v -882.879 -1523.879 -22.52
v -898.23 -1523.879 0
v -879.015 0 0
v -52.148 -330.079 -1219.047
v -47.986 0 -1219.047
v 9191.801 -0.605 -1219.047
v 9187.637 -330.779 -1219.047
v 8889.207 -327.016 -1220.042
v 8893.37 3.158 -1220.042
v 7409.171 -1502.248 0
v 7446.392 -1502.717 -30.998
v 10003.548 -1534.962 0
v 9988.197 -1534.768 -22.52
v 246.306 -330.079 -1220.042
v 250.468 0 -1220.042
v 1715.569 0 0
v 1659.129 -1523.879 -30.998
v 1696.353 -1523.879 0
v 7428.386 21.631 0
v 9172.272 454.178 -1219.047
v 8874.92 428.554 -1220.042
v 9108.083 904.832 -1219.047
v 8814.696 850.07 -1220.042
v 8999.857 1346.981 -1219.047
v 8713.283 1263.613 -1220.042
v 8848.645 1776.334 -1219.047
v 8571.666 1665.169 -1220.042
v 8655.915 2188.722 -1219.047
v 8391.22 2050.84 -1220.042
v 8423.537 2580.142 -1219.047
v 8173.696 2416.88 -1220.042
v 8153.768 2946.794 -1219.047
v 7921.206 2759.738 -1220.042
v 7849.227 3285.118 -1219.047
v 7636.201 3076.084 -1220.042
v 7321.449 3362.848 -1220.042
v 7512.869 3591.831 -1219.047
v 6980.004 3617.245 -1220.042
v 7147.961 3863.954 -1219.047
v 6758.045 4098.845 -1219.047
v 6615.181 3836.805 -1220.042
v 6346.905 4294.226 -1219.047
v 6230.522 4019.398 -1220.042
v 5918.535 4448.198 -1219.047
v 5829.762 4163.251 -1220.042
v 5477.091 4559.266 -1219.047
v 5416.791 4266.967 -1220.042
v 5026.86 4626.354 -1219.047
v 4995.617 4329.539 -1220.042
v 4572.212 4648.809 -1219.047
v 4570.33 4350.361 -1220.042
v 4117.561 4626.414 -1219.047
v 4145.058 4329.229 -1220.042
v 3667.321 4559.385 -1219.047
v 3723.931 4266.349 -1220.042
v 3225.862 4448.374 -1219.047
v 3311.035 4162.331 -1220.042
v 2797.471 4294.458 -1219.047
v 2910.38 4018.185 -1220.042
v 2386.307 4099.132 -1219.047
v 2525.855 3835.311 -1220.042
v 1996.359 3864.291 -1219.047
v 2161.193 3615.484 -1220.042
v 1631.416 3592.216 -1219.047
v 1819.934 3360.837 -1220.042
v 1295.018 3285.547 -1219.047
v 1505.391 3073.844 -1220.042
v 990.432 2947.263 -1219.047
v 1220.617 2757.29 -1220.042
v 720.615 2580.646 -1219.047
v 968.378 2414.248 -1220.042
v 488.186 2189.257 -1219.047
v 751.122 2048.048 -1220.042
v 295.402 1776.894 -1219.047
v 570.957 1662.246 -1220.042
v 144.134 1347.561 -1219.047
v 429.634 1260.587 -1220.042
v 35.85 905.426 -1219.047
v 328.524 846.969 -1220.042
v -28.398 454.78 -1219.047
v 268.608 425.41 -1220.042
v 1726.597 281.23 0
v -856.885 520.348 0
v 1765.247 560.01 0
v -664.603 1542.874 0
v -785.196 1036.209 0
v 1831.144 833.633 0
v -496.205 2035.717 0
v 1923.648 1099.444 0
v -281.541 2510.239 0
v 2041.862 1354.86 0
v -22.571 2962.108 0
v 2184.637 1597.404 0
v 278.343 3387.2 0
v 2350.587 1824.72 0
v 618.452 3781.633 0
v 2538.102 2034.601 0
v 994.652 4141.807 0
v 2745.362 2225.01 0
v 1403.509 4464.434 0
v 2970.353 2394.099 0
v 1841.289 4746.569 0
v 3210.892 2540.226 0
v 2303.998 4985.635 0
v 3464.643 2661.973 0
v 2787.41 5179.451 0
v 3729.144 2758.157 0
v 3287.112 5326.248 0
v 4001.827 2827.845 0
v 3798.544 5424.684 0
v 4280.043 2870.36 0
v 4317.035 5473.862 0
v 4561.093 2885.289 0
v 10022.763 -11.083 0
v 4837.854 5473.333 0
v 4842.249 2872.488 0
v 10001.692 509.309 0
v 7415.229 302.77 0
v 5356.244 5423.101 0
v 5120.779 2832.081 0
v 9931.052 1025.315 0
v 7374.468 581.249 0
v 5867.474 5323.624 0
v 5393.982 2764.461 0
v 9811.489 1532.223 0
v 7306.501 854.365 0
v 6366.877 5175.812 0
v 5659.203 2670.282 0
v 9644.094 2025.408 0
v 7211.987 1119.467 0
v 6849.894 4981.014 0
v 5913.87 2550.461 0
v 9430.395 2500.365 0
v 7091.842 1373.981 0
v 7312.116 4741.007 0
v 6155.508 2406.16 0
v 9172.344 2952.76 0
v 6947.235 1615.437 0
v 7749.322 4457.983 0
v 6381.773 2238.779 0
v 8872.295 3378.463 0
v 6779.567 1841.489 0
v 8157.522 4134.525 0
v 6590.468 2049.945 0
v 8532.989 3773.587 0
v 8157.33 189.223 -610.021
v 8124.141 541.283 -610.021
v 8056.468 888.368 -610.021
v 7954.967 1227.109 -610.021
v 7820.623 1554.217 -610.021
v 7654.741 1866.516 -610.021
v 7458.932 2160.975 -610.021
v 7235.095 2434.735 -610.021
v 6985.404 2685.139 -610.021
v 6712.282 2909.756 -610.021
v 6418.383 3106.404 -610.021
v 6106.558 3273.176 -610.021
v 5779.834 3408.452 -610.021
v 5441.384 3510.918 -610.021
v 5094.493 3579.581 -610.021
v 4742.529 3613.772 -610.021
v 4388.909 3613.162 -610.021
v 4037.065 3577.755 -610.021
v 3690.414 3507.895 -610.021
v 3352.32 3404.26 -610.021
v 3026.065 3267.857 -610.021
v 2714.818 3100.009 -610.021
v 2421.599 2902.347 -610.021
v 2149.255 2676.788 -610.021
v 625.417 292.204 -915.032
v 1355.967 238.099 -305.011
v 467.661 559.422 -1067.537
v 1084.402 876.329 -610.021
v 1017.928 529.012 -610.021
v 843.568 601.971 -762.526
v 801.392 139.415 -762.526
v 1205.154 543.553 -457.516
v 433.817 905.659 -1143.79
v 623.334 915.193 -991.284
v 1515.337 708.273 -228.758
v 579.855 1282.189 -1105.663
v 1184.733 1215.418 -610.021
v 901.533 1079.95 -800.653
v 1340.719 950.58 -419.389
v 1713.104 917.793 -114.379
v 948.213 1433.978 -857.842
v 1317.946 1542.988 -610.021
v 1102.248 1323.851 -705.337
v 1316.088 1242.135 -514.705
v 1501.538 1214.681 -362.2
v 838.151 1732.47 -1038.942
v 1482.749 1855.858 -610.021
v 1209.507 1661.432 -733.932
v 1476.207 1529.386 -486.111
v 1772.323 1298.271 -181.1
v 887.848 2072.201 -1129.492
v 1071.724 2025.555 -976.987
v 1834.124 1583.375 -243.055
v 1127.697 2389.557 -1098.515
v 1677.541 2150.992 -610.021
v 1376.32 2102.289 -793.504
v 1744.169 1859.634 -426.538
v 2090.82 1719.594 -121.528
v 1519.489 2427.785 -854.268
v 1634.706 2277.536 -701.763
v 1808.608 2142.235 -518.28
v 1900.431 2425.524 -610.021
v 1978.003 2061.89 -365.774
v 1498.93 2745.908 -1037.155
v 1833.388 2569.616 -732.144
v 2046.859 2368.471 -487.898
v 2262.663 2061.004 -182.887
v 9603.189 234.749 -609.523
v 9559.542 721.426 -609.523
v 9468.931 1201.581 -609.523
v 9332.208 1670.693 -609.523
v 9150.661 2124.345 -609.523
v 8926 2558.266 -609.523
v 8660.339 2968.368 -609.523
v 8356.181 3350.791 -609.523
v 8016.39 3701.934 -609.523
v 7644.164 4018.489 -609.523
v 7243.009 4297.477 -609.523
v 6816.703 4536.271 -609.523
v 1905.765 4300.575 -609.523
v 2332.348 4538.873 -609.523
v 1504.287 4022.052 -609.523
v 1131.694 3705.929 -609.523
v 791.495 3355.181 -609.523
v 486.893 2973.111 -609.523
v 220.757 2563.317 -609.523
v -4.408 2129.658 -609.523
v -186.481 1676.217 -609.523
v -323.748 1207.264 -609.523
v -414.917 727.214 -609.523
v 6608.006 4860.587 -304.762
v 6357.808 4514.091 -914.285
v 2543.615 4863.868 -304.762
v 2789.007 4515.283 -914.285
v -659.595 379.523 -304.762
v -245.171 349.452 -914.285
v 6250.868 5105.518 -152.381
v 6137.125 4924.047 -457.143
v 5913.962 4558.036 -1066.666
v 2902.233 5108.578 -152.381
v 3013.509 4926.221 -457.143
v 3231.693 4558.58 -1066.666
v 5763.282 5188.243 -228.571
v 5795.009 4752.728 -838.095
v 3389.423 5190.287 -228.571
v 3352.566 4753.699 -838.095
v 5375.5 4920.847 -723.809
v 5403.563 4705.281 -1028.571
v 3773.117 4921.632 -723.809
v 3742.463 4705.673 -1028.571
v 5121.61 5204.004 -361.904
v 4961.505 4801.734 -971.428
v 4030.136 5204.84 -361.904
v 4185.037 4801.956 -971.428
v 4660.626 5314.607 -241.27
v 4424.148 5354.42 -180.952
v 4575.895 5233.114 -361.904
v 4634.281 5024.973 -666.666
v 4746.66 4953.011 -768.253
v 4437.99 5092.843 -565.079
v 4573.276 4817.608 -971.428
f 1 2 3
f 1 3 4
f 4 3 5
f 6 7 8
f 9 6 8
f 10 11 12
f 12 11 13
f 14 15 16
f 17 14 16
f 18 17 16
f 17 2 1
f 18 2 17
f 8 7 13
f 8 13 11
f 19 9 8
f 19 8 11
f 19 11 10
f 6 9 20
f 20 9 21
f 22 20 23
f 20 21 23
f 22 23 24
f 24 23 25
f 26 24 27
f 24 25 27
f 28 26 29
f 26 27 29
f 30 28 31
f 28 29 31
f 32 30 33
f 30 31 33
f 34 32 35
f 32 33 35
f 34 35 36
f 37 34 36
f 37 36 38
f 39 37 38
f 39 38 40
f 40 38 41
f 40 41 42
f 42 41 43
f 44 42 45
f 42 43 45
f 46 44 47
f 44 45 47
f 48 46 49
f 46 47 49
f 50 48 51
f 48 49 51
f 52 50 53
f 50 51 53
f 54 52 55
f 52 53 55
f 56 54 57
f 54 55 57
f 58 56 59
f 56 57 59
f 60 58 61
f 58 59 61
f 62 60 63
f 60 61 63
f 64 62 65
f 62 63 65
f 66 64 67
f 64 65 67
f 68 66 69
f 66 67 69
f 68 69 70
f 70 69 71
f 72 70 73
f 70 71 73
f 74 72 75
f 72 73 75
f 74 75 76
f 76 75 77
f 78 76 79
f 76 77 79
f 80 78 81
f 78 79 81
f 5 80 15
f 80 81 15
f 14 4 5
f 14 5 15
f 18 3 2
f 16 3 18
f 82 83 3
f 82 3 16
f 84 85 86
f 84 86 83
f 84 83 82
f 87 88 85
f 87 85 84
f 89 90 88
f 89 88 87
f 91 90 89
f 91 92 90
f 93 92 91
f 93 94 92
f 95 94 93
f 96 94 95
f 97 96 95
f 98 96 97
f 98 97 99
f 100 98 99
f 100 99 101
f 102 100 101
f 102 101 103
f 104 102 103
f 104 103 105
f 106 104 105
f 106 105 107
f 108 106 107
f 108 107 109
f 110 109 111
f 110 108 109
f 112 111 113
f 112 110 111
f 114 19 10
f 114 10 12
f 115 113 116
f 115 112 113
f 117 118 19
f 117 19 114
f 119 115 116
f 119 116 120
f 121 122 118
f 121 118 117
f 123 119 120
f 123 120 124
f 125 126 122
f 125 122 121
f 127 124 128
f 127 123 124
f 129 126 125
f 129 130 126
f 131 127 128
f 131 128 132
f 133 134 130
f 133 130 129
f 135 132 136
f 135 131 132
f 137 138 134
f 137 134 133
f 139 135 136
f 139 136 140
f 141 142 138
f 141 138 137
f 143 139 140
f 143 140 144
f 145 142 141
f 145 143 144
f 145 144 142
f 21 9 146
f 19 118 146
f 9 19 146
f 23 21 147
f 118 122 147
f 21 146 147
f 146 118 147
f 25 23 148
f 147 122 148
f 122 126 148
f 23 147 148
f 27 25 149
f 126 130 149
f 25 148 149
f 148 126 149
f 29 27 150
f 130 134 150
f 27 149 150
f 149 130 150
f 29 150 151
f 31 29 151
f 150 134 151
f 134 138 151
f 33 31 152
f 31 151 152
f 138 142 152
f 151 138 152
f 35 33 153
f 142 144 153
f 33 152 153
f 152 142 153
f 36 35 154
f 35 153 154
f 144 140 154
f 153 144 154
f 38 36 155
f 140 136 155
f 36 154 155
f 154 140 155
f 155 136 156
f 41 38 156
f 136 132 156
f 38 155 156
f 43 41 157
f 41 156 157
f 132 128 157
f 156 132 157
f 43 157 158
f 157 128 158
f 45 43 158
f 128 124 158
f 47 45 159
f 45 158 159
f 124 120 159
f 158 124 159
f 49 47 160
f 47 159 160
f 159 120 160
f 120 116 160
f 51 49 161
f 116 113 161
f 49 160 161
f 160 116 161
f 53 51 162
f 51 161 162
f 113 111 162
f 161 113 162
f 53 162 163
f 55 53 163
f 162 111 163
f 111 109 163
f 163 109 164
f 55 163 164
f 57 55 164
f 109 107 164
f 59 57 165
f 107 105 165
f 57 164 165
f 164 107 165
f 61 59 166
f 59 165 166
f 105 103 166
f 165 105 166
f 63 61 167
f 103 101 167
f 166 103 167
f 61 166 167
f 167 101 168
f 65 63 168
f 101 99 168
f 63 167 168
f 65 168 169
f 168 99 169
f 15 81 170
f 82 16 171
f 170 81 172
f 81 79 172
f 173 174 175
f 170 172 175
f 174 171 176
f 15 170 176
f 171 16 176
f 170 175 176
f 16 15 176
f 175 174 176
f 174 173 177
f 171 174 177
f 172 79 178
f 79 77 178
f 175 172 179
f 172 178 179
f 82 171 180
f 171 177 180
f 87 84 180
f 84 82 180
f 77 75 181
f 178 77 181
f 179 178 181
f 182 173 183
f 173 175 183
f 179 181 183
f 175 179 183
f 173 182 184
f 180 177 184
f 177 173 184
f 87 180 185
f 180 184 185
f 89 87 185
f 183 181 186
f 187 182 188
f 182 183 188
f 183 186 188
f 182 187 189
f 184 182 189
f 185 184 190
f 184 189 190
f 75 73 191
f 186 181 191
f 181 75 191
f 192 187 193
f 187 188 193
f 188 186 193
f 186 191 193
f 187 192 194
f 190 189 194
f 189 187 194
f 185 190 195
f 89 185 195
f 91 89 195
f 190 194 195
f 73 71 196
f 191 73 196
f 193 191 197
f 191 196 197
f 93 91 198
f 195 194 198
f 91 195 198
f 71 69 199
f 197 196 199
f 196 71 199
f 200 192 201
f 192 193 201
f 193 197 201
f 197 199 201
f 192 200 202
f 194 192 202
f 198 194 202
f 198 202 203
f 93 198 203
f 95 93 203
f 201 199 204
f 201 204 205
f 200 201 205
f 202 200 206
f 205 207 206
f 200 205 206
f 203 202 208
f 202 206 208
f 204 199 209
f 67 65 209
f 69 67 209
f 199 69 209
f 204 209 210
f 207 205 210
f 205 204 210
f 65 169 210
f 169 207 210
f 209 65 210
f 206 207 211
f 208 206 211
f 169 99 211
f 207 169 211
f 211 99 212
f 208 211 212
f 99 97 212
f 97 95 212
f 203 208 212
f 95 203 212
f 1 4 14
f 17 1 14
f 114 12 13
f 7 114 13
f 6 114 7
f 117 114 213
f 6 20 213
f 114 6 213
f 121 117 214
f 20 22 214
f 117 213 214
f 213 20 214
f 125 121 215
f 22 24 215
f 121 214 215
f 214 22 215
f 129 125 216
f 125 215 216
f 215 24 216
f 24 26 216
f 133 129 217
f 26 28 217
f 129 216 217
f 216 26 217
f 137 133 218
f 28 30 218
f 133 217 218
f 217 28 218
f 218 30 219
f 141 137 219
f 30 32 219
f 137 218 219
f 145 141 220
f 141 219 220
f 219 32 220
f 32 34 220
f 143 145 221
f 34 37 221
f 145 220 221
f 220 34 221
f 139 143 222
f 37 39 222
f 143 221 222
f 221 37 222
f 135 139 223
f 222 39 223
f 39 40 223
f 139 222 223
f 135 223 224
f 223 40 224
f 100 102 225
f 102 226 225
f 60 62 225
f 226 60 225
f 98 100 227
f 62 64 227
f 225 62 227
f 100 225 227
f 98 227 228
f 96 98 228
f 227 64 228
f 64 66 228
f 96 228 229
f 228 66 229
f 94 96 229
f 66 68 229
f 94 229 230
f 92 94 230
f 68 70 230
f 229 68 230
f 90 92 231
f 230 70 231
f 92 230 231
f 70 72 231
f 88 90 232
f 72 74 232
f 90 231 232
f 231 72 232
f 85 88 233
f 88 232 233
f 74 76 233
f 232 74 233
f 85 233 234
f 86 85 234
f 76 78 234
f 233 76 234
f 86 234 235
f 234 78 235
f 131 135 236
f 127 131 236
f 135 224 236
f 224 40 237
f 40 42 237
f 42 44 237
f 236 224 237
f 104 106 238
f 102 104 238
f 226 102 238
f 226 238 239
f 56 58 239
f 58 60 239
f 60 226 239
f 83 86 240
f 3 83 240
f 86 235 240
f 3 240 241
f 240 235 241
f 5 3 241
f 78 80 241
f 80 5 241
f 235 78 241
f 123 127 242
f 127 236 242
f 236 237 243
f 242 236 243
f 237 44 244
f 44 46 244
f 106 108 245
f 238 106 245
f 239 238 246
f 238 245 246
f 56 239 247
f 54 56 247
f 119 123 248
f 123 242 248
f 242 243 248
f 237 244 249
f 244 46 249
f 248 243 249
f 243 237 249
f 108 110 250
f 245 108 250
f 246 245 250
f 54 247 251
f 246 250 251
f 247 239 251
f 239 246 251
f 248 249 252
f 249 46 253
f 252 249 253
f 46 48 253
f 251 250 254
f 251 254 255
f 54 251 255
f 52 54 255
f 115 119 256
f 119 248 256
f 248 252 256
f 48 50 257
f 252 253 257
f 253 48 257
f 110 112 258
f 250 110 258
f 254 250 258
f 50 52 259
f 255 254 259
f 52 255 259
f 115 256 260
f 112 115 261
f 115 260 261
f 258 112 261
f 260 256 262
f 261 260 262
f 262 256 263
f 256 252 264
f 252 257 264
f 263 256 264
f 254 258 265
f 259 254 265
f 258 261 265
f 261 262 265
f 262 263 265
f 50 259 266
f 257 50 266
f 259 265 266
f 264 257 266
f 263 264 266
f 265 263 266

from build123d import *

# Parameters (mm, degrees)
F3_DEPTH = 1524
F4_SIZE  = 1193.8


# Not quite as in the source:
# - two fillets or chamfers of one size are made in one step


with BuildPart() as f2:
    # F2: sweep along a path in F0
    with BuildLine(Plane.XY) as f2_path:
        ThreePointArc((9143.8182811757, 0), (4571.9091405878, 4600.8237785405), (0, 0))
    # F1 (on Front) → F2 (sweep)
    with BuildSketch(Plane.XZ):
        Polygon((1715.5686188401, 0), (0, 0), (-879.0148030063, 0), (-47.9862770429, -1219.0467339141), (250.468130578, -1220.0421605104), align=None)
    sweep(path=f2_path.line)

    # F3 (add): faces of the model
    f3_faces = [f2.faces().sort_by_distance(p)[0] for p in [
        (8841.9781663596, 3.806076708, -448.4847642762),
        (301.8641103743, 0, -448.4847642762),
    ]]
    extrude(f3_faces, amount=F3_DEPTH, dir=(-0.0126085764, -0.9999205087, 0))

    # F4
    f4_edges = [f2.edges().sort_by_distance(p)[0] for p in [
        (9023.369932, -1522.602351, -1219.544447),
        (82.025456, -1523.878855, -1219.544447),
    ]]
    chamfer(f4_edges, length=F4_SIZE)


solid = f2.part
